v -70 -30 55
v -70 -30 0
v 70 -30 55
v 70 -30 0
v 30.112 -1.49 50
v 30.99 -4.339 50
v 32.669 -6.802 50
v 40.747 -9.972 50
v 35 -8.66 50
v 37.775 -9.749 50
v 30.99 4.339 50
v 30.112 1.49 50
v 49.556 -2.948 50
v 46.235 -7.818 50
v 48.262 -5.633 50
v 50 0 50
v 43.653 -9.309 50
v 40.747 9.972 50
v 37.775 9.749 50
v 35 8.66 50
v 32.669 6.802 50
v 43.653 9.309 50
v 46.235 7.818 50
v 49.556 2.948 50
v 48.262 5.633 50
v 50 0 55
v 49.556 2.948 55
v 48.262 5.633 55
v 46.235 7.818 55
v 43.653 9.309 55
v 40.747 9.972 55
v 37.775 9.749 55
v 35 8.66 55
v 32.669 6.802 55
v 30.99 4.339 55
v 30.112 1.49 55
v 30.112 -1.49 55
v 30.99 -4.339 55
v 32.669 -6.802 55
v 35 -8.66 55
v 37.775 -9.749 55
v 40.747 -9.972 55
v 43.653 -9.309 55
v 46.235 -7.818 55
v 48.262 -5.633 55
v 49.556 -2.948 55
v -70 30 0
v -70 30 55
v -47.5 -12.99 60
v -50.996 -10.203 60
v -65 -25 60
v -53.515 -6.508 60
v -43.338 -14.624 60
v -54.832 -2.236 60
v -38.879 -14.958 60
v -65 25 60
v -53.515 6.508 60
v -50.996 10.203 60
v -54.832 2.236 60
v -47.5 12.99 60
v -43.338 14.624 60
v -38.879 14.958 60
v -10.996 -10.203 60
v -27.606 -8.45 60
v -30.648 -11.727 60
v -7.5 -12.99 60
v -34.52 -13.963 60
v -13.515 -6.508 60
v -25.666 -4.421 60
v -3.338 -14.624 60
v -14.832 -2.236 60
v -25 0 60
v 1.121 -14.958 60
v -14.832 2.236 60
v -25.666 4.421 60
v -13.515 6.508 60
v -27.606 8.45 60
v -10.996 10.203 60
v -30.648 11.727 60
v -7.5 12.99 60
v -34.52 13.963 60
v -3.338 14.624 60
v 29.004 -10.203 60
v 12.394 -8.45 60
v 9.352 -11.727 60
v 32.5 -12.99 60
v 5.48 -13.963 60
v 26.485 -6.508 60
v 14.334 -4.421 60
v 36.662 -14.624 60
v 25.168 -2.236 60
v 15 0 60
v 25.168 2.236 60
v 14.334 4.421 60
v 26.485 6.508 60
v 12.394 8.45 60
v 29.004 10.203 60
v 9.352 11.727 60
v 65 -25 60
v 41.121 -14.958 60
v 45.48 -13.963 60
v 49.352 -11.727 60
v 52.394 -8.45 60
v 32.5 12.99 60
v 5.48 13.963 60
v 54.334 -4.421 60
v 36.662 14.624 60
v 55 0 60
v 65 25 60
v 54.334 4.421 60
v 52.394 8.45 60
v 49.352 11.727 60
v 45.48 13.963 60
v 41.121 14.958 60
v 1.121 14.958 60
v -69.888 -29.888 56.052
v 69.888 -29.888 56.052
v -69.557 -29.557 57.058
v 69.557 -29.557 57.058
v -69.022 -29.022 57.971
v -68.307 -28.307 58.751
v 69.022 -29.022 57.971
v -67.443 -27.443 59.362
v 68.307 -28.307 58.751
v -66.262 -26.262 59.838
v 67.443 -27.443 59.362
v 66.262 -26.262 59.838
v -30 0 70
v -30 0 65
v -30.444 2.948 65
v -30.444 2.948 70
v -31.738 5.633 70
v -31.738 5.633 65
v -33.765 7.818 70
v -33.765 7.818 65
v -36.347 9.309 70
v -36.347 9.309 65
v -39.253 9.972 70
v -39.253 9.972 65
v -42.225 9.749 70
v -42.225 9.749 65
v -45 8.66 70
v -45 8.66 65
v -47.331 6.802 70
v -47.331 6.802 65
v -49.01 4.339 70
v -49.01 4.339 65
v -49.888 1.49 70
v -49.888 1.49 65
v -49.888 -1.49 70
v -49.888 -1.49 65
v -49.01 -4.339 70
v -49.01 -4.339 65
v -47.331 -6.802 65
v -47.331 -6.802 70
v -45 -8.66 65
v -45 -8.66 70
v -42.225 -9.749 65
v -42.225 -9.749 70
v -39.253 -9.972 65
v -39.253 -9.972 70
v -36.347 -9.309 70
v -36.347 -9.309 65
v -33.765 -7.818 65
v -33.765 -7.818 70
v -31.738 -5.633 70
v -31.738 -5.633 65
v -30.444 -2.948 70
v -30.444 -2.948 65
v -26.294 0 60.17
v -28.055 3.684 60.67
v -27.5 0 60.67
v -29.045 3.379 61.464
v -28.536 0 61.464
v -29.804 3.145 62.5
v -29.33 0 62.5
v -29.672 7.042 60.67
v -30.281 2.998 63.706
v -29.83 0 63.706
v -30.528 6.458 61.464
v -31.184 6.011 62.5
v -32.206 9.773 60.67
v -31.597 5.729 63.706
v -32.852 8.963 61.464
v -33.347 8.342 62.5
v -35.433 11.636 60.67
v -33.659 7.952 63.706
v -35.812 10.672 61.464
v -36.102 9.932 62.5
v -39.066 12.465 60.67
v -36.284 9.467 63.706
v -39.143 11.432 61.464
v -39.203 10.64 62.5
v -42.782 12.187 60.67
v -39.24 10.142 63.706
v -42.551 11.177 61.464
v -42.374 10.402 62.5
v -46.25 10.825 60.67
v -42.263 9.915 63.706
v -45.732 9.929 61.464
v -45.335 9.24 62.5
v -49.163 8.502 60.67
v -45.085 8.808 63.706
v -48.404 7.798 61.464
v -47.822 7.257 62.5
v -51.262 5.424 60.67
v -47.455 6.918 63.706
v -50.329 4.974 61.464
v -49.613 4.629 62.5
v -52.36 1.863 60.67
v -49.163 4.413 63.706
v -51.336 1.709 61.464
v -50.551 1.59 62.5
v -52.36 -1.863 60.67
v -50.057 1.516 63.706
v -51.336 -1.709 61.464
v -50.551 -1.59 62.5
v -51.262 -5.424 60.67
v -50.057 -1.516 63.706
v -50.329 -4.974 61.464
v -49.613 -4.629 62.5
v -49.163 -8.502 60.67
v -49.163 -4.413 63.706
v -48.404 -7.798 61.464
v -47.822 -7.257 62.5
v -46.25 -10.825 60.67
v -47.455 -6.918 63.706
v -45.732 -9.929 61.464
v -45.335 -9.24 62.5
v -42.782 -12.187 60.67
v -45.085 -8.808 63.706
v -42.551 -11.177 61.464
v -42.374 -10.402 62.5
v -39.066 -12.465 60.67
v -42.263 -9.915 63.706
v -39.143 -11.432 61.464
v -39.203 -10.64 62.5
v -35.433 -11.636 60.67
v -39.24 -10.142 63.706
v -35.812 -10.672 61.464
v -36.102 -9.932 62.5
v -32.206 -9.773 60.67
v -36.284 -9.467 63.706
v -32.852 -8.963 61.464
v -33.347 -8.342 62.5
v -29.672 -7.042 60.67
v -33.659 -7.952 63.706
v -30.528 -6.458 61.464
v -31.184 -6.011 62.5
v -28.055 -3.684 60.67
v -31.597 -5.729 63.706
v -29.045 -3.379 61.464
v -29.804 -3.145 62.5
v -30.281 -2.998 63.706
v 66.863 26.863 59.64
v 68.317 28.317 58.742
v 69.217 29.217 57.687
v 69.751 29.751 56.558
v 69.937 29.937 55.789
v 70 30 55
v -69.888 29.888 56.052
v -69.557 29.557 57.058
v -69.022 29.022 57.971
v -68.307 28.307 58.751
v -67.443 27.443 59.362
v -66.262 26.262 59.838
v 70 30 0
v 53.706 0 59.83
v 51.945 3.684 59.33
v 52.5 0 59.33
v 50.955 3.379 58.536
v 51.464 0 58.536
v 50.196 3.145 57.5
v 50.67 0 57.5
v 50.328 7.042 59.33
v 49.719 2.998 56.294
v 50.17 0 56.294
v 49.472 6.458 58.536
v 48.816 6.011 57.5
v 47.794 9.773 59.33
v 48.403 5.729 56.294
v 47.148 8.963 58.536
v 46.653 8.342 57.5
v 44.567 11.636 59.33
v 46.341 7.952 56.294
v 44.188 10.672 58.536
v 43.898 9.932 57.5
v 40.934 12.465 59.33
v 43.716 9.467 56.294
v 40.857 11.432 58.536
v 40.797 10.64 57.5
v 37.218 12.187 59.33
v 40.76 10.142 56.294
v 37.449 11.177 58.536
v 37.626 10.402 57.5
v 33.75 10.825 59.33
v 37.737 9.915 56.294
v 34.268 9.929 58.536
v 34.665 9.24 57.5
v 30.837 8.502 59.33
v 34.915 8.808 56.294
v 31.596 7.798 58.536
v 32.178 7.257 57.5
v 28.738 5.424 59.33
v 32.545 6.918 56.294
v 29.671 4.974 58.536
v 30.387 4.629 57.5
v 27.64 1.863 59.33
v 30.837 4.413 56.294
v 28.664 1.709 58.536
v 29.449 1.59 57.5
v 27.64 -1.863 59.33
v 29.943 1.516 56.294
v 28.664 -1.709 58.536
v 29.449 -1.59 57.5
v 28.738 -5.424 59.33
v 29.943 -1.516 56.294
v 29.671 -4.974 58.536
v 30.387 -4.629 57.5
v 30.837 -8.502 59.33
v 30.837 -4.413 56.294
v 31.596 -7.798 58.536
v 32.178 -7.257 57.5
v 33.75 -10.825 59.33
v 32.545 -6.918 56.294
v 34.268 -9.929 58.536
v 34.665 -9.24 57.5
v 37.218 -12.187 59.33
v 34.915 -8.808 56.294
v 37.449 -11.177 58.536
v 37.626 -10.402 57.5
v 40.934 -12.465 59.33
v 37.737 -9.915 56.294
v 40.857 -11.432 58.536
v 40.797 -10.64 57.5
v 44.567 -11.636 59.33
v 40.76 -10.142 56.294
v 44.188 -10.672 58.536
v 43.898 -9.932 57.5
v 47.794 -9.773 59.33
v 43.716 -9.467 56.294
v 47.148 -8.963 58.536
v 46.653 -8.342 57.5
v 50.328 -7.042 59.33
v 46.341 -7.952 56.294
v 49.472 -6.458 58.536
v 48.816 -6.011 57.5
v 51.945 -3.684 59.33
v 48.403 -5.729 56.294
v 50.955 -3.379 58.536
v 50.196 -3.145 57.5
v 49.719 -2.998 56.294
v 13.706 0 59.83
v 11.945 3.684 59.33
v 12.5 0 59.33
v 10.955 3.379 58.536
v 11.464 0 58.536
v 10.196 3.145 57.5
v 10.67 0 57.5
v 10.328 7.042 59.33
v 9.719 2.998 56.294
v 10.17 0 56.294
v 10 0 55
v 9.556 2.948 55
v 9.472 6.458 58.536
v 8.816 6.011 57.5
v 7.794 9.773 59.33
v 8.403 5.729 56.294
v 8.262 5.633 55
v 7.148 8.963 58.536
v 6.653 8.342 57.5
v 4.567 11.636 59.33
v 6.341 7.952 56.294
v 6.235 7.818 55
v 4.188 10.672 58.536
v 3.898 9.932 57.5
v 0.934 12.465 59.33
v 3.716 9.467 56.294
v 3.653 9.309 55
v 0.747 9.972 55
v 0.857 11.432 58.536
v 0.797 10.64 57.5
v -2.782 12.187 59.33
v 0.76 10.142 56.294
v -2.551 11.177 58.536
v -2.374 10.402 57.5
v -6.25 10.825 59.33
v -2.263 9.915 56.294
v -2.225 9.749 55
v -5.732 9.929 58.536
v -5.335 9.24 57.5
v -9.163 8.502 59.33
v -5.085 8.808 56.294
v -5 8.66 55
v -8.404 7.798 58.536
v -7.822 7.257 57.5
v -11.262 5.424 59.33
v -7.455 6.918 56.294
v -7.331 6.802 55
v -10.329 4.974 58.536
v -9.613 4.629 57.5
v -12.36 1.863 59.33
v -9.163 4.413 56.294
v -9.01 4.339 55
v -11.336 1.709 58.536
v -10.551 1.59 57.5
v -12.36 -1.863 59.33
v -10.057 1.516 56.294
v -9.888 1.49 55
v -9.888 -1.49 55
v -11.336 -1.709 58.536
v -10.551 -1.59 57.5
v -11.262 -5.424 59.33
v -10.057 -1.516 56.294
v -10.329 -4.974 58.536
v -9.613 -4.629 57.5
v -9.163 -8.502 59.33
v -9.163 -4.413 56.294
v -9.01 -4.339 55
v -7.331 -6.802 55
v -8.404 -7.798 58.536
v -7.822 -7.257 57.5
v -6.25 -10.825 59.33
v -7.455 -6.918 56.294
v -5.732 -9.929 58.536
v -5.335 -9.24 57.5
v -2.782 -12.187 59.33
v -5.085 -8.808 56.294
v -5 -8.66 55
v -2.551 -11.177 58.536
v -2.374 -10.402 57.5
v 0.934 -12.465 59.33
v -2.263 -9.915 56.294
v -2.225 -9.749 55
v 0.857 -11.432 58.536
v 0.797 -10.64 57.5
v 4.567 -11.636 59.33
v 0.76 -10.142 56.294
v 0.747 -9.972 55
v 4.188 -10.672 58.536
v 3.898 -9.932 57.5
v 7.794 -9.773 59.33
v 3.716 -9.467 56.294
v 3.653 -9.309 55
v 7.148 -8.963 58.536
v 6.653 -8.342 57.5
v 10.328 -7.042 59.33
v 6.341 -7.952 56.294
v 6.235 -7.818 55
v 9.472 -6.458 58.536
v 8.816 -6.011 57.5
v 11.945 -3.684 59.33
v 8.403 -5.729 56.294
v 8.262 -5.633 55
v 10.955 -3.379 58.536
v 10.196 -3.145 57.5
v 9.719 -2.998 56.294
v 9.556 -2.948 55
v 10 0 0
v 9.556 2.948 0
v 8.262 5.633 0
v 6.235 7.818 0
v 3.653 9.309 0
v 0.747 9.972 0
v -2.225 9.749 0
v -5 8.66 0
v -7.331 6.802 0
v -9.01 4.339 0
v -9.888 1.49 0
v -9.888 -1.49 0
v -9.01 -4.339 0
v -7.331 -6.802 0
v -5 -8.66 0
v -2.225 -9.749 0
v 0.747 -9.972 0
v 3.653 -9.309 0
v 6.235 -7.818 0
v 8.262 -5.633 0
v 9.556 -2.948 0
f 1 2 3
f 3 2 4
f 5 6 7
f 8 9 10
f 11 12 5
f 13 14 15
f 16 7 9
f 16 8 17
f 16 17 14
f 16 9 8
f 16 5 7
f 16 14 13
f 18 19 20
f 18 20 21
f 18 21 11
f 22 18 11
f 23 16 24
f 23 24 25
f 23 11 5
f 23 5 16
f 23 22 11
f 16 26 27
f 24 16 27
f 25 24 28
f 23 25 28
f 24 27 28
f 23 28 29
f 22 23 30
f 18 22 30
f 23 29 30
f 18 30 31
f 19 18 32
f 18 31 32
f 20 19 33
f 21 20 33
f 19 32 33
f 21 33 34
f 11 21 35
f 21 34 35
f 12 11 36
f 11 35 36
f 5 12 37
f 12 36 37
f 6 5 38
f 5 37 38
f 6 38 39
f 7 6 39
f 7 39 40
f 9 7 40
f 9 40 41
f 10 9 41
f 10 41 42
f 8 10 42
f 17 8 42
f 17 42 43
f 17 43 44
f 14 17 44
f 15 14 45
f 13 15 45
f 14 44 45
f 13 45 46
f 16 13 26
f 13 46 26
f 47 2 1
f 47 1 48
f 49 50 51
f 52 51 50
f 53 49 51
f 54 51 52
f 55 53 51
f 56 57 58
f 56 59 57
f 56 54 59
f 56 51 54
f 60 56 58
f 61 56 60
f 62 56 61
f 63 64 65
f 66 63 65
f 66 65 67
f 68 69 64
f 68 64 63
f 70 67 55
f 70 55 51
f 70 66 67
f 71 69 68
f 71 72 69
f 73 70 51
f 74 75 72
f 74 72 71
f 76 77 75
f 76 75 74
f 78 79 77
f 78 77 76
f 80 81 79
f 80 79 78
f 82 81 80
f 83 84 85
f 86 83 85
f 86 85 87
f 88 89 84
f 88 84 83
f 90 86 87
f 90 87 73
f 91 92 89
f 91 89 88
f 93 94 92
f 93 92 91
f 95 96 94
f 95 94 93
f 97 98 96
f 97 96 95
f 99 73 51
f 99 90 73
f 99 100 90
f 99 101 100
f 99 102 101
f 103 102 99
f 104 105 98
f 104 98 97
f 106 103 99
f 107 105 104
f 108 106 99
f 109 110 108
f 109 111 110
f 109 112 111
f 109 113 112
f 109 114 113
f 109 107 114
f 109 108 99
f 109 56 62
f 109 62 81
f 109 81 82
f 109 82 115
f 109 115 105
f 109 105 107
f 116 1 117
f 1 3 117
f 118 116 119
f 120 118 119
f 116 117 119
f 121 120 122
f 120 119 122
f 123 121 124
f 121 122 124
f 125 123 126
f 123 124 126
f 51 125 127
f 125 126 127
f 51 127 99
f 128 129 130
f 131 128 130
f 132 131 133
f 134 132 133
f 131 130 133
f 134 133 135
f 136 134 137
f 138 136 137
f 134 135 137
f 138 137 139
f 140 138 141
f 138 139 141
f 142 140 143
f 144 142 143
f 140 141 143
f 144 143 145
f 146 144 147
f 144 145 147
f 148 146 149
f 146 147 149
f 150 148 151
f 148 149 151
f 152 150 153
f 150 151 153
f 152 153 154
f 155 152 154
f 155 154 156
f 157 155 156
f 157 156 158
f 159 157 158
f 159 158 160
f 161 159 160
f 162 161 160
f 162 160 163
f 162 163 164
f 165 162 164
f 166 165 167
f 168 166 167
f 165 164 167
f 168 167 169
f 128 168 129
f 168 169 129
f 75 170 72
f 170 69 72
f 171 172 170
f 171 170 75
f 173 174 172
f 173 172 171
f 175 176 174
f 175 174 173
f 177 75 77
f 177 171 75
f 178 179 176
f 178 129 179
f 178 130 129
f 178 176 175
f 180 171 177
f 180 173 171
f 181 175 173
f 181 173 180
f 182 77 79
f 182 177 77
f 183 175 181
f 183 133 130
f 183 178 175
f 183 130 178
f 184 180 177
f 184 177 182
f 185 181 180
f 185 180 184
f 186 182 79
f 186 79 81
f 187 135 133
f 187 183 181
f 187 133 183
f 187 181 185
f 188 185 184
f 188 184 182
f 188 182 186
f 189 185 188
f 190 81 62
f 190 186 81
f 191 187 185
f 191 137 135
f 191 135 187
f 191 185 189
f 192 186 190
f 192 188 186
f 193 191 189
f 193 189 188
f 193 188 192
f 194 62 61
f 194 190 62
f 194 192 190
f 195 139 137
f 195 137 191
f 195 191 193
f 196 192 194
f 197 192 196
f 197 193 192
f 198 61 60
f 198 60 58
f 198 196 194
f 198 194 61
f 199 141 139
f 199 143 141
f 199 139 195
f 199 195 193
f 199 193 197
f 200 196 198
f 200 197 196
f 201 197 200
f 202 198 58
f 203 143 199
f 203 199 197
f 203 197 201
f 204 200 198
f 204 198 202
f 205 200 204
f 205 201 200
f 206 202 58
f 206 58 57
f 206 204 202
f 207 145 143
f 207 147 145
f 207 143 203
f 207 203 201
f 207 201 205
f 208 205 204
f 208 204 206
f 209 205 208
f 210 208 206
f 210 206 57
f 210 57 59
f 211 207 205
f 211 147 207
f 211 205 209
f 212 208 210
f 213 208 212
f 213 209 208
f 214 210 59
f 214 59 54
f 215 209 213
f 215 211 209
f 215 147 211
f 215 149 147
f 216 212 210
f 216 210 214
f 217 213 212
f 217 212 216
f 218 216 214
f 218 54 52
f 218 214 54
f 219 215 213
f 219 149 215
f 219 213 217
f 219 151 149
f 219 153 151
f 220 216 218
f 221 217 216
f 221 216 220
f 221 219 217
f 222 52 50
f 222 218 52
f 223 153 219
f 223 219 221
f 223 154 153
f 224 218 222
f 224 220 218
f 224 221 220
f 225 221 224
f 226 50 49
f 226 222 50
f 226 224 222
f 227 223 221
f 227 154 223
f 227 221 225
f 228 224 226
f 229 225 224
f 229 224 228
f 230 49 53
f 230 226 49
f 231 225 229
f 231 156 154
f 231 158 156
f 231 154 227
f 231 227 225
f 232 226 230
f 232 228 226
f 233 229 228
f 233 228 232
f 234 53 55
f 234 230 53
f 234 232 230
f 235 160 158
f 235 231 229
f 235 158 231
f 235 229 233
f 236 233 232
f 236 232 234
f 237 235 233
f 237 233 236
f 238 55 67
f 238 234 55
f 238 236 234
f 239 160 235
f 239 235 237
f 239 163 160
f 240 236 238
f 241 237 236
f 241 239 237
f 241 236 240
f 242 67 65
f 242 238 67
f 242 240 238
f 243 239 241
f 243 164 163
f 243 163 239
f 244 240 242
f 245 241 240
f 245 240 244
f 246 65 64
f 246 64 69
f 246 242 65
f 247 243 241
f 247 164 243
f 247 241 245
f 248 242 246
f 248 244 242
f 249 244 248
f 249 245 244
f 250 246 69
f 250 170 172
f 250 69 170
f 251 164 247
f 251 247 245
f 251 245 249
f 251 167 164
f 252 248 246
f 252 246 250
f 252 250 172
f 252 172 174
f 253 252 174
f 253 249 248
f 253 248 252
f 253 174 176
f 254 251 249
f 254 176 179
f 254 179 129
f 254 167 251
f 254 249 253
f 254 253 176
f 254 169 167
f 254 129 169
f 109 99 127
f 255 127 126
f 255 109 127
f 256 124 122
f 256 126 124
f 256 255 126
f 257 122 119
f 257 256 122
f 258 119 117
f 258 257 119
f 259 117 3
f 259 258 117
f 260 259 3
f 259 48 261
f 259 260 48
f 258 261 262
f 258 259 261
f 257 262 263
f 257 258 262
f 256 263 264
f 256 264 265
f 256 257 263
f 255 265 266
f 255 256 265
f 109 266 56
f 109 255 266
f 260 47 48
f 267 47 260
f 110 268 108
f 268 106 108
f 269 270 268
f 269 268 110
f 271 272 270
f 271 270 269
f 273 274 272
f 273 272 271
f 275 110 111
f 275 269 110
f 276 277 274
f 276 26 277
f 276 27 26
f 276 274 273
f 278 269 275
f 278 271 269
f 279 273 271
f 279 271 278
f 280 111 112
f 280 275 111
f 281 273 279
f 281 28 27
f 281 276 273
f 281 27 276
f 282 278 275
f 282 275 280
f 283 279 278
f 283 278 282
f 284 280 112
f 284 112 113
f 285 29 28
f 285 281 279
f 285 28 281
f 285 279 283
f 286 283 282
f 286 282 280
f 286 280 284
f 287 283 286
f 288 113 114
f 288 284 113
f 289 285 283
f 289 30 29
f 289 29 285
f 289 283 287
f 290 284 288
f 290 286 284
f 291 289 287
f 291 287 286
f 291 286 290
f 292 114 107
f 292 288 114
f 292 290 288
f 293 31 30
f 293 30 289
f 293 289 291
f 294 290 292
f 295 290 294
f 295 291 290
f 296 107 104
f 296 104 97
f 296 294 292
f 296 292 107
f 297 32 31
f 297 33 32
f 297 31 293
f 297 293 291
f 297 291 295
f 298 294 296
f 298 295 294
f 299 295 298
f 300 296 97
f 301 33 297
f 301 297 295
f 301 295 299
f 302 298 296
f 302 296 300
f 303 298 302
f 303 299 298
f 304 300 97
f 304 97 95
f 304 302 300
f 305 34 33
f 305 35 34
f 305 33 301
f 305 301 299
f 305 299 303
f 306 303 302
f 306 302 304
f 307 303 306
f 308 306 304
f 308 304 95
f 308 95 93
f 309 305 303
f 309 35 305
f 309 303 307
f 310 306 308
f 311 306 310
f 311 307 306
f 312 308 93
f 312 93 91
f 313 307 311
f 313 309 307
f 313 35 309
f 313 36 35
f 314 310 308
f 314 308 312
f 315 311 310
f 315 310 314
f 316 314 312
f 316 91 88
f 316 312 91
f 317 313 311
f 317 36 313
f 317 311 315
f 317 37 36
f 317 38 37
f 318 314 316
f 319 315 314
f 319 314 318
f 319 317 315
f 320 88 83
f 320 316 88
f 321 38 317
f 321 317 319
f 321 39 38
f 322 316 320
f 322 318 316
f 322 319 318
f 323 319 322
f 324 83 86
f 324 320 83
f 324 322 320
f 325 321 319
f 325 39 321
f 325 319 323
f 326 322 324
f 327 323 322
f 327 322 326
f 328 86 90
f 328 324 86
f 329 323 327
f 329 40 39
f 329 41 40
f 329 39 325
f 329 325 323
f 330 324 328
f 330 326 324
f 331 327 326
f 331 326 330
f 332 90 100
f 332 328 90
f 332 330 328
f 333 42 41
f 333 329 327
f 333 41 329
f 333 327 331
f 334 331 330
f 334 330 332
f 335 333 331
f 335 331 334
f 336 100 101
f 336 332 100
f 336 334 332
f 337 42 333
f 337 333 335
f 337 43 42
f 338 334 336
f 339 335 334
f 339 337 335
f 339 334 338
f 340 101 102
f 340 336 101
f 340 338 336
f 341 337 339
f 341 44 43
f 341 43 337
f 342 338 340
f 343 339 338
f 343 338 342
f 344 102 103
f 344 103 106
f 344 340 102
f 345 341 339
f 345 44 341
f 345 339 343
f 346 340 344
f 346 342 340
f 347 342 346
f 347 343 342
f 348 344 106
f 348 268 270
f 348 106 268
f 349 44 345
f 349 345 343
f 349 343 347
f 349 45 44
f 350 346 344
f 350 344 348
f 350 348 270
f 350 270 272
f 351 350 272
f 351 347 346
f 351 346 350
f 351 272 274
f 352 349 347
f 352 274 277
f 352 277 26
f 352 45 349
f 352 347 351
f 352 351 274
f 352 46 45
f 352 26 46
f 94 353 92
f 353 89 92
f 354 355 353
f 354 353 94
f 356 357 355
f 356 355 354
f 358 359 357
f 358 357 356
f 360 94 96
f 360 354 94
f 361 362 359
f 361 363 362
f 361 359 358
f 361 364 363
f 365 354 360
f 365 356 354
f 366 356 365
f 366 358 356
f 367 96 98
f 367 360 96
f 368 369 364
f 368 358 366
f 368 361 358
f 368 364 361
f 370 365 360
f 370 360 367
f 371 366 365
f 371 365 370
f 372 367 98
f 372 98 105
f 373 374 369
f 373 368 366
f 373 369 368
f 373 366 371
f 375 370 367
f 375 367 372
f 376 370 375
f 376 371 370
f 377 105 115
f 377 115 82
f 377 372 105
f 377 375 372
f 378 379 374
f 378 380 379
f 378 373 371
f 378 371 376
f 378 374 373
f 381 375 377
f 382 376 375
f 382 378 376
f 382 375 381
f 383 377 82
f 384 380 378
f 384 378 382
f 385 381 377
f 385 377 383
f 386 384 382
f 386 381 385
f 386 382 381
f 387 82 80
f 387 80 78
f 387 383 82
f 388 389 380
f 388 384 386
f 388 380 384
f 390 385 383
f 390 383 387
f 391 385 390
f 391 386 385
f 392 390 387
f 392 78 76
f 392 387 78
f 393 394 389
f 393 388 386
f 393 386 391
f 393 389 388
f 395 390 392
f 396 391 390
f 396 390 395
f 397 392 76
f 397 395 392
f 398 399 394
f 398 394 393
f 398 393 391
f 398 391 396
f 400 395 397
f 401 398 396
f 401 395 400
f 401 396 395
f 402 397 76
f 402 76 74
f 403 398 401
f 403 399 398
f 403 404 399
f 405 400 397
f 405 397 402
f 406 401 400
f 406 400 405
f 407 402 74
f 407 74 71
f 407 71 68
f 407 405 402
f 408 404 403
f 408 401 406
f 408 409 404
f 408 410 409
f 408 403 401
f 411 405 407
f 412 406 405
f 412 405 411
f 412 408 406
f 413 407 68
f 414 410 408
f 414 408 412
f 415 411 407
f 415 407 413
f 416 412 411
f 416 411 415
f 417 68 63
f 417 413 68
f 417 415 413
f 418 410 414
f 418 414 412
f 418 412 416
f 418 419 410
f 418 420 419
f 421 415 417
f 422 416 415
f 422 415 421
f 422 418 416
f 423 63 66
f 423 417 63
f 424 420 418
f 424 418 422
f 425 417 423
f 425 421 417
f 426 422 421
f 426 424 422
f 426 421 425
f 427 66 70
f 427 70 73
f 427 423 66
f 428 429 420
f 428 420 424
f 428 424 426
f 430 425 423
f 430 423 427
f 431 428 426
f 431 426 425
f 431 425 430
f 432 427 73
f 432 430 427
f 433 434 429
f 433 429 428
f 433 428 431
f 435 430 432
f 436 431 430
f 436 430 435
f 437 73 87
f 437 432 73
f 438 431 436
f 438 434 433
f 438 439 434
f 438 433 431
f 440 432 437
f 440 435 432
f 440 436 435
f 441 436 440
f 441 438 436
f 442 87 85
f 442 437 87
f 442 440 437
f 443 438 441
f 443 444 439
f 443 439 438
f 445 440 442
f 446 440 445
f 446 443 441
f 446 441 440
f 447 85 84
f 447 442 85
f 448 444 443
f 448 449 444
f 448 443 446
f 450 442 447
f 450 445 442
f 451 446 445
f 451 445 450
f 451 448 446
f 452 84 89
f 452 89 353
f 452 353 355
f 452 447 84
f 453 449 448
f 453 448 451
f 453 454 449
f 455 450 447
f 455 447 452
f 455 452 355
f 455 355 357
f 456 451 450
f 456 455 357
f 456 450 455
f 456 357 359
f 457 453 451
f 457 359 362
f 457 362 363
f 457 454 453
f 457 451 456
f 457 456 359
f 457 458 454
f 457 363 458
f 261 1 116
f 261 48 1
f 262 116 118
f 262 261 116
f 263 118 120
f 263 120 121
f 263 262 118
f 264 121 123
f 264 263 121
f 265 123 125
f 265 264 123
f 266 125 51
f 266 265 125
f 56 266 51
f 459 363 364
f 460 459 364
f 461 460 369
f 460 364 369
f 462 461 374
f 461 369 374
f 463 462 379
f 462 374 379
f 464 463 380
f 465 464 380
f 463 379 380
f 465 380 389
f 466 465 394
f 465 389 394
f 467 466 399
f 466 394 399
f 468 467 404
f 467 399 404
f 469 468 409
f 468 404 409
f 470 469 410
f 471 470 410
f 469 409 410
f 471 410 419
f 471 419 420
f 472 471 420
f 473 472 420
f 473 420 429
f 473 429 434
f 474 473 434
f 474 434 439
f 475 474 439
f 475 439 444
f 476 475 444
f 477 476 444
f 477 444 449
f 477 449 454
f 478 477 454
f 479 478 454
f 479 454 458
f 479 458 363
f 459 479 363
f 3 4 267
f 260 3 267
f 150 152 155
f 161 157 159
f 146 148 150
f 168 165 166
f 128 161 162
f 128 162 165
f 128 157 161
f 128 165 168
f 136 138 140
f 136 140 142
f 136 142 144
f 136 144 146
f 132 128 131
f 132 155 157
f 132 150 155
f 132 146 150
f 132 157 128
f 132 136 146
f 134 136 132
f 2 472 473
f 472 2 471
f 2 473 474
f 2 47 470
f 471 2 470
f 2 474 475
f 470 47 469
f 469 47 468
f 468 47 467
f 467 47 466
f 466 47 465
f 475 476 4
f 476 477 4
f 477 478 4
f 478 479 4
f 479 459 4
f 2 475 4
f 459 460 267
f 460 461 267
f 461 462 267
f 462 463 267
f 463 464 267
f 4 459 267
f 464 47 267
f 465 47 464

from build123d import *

# Parameters (mm, degrees)
F0_W     = 140
F0_H     = 60
F1_DEPTH = 60
F2_R     = 10
F5_DEPTH = 10
F3_R     = 10
F6_DEPTH = 10
F4_R     = 10
F7_DEPTH = 79.5
F8_R     = 5


with BuildPart() as f1:
    # F0 (on Top) → F1 (new body)
    with BuildSketch(Plane.XY):
        Rectangle(F0_W, F0_H)
    extrude(amount=F1_DEPTH)

    # F2 (on face) → F5 (join)
    with BuildSketch(Plane.XY.offset(60)):
        with Locations((-40, 0)):
            Circle(F2_R)
    extrude(amount=F5_DEPTH)

    # F3 (on face) → F6 (cut)
    with BuildSketch(Plane.XY.offset(60)):
        with Locations((40, 0)):
            Circle(F3_R)
    extrude(amount=-F6_DEPTH, mode=Mode.SUBTRACT)

    # F4 (on face) → F7 (cut)
    with BuildSketch(Plane.XY.offset(60)):
        Circle(F4_R)
    extrude(amount=-F7_DEPTH, mode=Mode.SUBTRACT)

    # F8
    f8_edges = [f1.edges().sort_by_distance(p)[0] for p in [
        (-70, 0, 60),
        (0, -30, 60),
        (70, 0, 60),
        (0, 30, 60),
        (-50, 0, 60),
        (-10, 0, 60),
        (30, 0, 60),
    ]]
    fillet(f8_edges, radius=F8_R)


solid = f1.part
